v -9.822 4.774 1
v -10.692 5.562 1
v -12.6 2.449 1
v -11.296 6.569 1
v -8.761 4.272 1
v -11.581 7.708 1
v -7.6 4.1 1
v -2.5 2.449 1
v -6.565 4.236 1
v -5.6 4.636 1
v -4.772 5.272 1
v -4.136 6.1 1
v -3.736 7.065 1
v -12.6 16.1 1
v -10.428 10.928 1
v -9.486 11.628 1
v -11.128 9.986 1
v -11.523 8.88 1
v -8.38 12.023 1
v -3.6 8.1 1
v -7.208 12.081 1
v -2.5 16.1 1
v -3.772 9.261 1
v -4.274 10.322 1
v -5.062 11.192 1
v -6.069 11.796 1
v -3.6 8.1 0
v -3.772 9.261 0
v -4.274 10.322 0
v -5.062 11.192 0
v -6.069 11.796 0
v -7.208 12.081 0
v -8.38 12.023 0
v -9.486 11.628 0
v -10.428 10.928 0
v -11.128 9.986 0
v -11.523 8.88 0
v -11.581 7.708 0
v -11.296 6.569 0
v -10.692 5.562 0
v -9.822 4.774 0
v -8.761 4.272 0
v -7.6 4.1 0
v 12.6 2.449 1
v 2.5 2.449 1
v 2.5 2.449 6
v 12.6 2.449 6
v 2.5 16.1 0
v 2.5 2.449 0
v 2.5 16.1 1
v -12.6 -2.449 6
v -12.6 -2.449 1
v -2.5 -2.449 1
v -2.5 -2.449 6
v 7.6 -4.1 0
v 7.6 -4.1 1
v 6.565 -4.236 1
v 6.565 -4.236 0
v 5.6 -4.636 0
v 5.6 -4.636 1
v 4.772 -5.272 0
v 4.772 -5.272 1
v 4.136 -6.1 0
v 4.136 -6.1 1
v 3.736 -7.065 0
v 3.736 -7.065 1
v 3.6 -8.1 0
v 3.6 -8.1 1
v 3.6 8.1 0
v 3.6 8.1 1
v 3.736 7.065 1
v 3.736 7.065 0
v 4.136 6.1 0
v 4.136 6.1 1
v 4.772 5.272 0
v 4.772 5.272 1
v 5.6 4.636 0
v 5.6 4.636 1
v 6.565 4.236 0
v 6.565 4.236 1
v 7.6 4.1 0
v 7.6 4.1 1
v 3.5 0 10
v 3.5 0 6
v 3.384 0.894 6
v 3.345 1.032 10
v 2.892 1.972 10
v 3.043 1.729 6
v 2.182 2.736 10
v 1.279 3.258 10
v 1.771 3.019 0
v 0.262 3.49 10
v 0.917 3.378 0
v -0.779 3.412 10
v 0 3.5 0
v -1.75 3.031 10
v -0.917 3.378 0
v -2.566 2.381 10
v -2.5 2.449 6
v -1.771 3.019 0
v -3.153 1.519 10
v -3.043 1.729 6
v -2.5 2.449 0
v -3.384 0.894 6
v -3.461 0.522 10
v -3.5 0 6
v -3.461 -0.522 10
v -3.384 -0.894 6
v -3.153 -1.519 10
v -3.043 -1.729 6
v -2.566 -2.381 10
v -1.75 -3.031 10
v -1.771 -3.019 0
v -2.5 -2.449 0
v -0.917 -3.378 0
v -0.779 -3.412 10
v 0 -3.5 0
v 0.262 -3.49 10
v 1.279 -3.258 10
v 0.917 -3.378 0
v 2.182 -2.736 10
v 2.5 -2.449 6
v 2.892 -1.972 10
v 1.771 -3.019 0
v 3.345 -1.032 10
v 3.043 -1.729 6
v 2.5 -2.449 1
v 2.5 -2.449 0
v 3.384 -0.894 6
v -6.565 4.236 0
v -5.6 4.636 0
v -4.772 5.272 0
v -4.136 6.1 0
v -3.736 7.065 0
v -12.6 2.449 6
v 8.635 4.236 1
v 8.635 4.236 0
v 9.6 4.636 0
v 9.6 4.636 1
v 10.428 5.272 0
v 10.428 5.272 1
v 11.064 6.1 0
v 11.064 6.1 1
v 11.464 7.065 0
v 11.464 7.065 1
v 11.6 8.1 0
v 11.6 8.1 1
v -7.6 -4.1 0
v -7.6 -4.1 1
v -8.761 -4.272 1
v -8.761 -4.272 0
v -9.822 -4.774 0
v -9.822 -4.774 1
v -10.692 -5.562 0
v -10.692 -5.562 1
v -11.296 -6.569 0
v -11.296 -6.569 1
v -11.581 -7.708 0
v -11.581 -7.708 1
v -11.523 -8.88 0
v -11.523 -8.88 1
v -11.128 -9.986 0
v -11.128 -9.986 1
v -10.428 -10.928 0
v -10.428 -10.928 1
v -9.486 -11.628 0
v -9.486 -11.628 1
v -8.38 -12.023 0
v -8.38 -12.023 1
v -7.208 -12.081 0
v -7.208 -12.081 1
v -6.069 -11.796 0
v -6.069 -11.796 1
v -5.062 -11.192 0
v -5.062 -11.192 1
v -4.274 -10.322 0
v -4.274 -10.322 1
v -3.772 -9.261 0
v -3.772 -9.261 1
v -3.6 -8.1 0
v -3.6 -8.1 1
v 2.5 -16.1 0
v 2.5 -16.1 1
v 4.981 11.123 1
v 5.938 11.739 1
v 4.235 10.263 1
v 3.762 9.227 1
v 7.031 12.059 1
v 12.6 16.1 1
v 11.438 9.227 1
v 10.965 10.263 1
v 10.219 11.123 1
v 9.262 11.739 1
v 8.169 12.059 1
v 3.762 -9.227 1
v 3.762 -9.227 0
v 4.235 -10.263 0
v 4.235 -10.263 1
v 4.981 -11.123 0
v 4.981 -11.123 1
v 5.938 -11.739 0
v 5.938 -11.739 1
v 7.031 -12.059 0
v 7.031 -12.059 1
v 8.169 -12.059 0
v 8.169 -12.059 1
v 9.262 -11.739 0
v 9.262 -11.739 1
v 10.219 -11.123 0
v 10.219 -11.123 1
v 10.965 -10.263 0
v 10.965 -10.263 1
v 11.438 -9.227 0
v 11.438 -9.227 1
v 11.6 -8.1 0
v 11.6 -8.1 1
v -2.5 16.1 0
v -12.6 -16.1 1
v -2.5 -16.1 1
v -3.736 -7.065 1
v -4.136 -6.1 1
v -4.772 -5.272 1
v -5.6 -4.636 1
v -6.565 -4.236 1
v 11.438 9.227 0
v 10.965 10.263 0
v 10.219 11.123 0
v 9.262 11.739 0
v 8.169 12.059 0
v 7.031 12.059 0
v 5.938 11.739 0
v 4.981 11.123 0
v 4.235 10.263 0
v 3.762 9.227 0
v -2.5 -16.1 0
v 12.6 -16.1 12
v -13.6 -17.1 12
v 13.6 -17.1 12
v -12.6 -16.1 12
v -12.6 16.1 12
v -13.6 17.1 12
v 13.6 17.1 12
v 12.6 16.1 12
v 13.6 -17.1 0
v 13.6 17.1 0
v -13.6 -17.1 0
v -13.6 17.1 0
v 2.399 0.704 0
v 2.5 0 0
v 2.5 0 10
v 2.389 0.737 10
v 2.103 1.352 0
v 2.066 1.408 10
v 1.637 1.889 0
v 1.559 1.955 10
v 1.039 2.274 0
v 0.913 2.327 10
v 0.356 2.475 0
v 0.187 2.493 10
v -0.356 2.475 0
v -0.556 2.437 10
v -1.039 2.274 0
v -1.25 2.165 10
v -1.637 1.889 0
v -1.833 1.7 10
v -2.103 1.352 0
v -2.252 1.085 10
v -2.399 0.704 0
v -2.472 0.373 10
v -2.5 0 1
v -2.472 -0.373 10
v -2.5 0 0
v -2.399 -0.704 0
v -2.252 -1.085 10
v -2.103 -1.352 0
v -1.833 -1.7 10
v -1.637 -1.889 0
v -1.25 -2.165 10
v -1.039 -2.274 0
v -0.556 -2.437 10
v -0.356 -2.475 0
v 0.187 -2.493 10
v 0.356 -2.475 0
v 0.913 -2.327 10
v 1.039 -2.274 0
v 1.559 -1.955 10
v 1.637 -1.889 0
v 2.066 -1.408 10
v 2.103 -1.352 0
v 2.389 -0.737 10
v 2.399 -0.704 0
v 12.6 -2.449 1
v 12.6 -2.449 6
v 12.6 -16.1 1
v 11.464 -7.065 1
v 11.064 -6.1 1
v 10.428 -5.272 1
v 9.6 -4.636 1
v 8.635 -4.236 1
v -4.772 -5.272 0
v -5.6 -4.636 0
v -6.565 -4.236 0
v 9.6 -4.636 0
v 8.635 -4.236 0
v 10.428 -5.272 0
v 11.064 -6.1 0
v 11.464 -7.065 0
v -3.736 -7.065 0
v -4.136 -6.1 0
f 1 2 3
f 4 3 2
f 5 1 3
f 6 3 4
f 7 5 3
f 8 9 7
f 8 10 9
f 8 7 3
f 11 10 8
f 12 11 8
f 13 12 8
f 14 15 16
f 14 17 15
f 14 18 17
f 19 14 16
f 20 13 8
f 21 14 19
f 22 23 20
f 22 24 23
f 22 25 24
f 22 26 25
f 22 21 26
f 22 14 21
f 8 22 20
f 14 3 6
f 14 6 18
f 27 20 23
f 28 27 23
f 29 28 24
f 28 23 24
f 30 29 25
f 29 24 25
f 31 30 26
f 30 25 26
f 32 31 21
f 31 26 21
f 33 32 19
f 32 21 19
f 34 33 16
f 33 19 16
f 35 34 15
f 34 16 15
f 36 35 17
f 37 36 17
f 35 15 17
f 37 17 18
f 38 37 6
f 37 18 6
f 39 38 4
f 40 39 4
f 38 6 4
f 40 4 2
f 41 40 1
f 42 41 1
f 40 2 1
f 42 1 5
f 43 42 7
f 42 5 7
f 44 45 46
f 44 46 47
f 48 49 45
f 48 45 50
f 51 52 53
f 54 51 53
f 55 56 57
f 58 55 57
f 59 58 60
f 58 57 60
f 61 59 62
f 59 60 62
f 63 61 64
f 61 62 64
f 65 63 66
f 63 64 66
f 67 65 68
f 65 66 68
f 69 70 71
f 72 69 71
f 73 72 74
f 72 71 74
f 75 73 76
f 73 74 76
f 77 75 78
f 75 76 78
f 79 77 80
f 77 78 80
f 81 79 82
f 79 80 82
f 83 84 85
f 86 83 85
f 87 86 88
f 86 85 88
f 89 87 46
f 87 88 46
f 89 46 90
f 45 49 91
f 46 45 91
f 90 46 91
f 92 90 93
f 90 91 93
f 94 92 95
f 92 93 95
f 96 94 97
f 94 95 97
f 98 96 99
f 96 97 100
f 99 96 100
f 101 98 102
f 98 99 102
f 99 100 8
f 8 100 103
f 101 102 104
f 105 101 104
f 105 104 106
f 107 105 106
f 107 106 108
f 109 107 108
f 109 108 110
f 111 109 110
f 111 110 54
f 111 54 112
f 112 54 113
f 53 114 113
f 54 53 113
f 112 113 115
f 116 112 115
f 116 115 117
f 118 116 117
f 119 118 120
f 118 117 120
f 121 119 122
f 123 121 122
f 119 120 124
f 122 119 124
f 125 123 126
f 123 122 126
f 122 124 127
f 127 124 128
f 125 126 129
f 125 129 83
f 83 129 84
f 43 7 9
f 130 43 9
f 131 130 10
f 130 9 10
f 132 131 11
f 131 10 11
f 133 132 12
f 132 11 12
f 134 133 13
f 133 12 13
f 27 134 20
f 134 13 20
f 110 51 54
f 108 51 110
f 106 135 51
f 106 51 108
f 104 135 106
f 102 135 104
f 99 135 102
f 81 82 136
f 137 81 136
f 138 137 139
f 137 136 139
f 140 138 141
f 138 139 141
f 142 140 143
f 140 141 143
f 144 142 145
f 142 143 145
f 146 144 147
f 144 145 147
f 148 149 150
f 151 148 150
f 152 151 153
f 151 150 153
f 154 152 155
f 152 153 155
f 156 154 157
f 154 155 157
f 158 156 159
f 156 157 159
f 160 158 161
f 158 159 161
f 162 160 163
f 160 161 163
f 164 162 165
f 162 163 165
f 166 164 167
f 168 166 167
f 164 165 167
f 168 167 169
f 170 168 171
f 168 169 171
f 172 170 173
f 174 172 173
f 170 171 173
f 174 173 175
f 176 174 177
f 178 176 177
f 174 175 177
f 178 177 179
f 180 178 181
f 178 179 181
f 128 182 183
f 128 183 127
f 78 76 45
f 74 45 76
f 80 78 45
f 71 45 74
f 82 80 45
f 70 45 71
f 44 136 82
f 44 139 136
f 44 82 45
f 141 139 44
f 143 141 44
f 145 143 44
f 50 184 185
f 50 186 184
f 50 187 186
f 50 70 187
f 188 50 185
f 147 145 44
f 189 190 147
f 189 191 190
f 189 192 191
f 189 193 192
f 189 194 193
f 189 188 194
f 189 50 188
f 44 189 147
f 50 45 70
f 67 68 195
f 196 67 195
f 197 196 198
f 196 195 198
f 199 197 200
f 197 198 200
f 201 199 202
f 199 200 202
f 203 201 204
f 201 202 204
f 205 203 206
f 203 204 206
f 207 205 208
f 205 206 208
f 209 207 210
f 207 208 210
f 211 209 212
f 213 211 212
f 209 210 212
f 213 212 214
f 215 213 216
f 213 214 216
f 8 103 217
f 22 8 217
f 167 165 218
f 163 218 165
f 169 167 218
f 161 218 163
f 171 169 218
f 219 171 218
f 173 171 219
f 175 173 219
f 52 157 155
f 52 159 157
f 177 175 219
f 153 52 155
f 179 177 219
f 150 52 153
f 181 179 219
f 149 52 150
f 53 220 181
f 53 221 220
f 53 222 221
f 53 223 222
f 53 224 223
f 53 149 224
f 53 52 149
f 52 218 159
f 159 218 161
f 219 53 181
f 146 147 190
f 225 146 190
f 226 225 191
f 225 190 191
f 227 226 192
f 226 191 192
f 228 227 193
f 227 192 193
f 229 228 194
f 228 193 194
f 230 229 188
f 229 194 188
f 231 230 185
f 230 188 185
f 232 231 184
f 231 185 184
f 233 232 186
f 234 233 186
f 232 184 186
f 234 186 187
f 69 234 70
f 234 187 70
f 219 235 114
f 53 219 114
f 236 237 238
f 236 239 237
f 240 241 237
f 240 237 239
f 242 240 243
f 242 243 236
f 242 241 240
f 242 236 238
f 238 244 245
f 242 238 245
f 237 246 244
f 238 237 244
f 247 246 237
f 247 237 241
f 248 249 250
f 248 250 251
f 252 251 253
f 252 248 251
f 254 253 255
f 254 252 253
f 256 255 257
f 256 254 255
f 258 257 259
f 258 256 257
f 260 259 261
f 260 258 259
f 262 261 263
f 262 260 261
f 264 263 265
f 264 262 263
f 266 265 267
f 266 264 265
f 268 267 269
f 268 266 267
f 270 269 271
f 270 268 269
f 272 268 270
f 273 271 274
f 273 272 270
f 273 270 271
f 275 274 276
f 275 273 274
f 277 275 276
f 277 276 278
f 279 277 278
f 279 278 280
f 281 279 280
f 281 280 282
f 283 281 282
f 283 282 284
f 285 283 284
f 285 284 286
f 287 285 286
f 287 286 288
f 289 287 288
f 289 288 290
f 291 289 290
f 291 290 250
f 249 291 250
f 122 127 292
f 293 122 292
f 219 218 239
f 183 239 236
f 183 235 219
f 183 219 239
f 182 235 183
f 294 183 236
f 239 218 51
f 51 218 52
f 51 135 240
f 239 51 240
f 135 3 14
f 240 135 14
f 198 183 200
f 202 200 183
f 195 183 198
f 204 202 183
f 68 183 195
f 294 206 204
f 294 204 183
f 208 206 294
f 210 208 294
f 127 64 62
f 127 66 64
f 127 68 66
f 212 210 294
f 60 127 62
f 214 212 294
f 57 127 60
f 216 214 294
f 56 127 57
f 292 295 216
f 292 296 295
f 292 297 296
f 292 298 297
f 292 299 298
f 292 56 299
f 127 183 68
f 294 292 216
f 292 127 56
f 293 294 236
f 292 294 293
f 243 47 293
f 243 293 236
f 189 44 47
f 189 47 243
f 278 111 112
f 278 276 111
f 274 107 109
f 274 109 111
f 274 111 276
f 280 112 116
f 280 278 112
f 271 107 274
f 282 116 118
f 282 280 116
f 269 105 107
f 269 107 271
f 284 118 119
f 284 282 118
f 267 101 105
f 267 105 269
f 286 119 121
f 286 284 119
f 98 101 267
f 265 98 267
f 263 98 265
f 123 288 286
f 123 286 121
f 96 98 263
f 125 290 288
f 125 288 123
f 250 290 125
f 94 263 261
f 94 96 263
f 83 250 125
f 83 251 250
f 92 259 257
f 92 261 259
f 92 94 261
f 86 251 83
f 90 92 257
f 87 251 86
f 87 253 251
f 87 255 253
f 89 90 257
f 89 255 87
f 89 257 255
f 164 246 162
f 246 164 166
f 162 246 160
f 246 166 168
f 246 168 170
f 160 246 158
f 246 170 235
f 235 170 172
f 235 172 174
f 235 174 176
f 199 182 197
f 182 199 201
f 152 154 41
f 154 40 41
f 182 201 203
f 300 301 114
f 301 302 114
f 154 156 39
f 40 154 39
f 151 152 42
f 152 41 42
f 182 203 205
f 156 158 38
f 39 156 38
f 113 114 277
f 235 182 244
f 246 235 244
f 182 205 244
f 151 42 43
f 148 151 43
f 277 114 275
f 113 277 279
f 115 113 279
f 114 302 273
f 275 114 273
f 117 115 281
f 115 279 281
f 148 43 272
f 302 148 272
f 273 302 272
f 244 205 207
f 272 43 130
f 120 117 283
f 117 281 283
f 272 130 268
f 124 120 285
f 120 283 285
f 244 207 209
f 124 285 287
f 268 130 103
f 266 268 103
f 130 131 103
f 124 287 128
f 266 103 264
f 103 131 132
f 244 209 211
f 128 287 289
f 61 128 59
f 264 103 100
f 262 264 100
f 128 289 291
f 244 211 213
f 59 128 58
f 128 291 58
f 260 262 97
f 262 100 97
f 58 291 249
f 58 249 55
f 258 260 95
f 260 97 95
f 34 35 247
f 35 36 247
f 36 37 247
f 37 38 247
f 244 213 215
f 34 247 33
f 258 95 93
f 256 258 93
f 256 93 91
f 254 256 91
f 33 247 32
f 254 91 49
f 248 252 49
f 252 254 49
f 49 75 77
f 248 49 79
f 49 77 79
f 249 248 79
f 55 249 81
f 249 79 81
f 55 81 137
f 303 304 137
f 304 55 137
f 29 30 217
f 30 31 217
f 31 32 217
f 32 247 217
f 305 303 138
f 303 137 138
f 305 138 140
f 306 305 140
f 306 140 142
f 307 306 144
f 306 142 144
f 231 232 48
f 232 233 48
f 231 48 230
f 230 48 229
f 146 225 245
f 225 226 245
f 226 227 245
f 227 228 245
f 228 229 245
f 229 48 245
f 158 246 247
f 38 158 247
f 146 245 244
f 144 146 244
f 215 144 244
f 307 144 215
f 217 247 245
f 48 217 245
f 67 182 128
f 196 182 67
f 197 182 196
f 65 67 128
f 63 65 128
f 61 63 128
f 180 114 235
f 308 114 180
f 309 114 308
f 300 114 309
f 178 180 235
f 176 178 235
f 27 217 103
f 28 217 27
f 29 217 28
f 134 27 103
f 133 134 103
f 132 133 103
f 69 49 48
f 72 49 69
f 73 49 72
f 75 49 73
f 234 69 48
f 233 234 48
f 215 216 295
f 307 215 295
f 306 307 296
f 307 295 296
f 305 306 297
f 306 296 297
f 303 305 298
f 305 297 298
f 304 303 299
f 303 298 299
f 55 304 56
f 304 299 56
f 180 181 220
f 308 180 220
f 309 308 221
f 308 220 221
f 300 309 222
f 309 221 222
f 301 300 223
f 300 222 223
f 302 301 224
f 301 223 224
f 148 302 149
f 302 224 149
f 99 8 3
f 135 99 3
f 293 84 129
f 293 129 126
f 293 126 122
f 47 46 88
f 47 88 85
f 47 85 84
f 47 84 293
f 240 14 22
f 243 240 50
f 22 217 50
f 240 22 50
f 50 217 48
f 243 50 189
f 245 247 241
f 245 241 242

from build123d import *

# Parameters (mm, degrees)
F0_W     = 27.2
F0_H     = 34.2
F0_W_2   = 25.2
F0_H_2   = 32.2
F1_DEPTH = 12
F2_W     = 10.1
F2_H     = 32.2
F3_DEPTH = 1
F4_R     = 3.5
F4_R_2   = 2.5
F5_DEPTH = 10
F7_DEPTH = 25.4
F8_W     = 10.1
F8_H     = 4.89898
F9_DEPTH = 5


with BuildPart() as f1:
    # F0 (on Top) → F1 (new body)
    with BuildSketch(Plane.XY):
        Rectangle(F0_W, F0_H)
        Rectangle(F0_W_2, F0_H_2, mode=Mode.SUBTRACT)
    extrude(amount=F1_DEPTH)

    # F2 (on Top) → F3 (join)
    with BuildSketch(Plane.XY):
        with Locations((-7.55, 0)):
            Rectangle(F2_W, F2_H)
        with Locations((7.55, 0)):
            Rectangle(F2_W, F2_H)
    extrude(amount=F3_DEPTH)

    # F4 (on Top) → F5 (join)
    with BuildSketch(Plane.XY):
        Circle(F4_R)
        Circle(F4_R_2, mode=Mode.SUBTRACT)
    extrude(amount=F5_DEPTH)

    # F6 (on face) → F7 (cut)
    with BuildSketch(Plane.XY.offset(1)):
        with BuildLine():
            Line((-7.6, 4.1), (-7.6, 8.1))
            Line((-7.6, 8.1), (-3.6, 8.1))
            ThreePointArc((-3.6, 8.1), (-10.428427, 10.928427), (-7.6, 4.1))
        make_face()
        with BuildLine():
            ThreePointArc((11.6, 8.1), (7.6, 12.1), (3.6, 8.1))
            Line((3.6, 8.1), (7.6, 8.1))
            Line((7.6, 8.1), (7.6, 4.1))
            ThreePointArc((7.6, 4.1), (10.428427, 5.271573), (11.6, 8.1))
        make_face()
        with BuildLine():
            Line((7.6, 8.1), (3.6, 8.1))
            ThreePointArc((3.6, 8.1), (4.771573, 5.271573), (7.6, 4.1))
            Line((7.6, 4.1), (7.6, 8.1))
        make_face()
        with BuildLine():
            Line((-3.6, 8.1), (-7.6, 8.1))
            Line((-7.6, 8.1), (-7.6, 4.1))
            ThreePointArc((-7.6, 4.1), (-4.771573, 5.271573), (-3.6, 8.1))
        make_face()
        with BuildLine():
            Line((-7.6, -8.1), (-7.6, -4.1))
            ThreePointArc((-7.6, -4.1), (-10.428427, -10.928427), (-3.6, -8.1))
            Line((-3.6, -8.1), (-7.6, -8.1))
        make_face()
        with BuildLine():
            ThreePointArc((-3.6, -8.1), (-4.771573, -5.271573), (-7.6, -4.1))
            Line((-7.6, -4.1), (-7.6, -8.1))
            Line((-7.6, -8.1), (-3.6, -8.1))
        make_face()
        with BuildLine():
            ThreePointArc((11.6, -8.1), (10.428427, -5.271573), (7.6, -4.1))
            Line((7.6, -4.1), (7.6, -8.1))
            Line((7.6, -8.1), (3.6, -8.1))
            ThreePointArc((3.6, -8.1), (7.6, -12.1), (11.6, -8.1))
        make_face()
        with BuildLine():
            Line((7.6, -8.1), (7.6, -4.1))
            ThreePointArc((7.6, -4.1), (4.771573, -5.271573), (3.6, -8.1))
            Line((3.6, -8.1), (7.6, -8.1))
        make_face()
    extrude(amount=-F7_DEPTH, mode=Mode.SUBTRACT)

    # F8 (on face) → F9 (join)
    with BuildSketch(Plane.XY.offset(1)):
        with BuildLine():
            Line((-12.6, 2.44949), (-12.6, -2.44949))
            Line((-12.6, -2.44949), (-2.5, -2.44949))
            ThreePointArc((-2.5, -2.44949), (-3.5, 0), (-2.5, 2.44949))
            Line((-2.5, 2.44949), (-12.6, 2.44949))
        make_face()
        with Locations((7.55, 0)):
            Rectangle(F8_W, F8_H)
    extrude(amount=F9_DEPTH)


solid = f1.part
